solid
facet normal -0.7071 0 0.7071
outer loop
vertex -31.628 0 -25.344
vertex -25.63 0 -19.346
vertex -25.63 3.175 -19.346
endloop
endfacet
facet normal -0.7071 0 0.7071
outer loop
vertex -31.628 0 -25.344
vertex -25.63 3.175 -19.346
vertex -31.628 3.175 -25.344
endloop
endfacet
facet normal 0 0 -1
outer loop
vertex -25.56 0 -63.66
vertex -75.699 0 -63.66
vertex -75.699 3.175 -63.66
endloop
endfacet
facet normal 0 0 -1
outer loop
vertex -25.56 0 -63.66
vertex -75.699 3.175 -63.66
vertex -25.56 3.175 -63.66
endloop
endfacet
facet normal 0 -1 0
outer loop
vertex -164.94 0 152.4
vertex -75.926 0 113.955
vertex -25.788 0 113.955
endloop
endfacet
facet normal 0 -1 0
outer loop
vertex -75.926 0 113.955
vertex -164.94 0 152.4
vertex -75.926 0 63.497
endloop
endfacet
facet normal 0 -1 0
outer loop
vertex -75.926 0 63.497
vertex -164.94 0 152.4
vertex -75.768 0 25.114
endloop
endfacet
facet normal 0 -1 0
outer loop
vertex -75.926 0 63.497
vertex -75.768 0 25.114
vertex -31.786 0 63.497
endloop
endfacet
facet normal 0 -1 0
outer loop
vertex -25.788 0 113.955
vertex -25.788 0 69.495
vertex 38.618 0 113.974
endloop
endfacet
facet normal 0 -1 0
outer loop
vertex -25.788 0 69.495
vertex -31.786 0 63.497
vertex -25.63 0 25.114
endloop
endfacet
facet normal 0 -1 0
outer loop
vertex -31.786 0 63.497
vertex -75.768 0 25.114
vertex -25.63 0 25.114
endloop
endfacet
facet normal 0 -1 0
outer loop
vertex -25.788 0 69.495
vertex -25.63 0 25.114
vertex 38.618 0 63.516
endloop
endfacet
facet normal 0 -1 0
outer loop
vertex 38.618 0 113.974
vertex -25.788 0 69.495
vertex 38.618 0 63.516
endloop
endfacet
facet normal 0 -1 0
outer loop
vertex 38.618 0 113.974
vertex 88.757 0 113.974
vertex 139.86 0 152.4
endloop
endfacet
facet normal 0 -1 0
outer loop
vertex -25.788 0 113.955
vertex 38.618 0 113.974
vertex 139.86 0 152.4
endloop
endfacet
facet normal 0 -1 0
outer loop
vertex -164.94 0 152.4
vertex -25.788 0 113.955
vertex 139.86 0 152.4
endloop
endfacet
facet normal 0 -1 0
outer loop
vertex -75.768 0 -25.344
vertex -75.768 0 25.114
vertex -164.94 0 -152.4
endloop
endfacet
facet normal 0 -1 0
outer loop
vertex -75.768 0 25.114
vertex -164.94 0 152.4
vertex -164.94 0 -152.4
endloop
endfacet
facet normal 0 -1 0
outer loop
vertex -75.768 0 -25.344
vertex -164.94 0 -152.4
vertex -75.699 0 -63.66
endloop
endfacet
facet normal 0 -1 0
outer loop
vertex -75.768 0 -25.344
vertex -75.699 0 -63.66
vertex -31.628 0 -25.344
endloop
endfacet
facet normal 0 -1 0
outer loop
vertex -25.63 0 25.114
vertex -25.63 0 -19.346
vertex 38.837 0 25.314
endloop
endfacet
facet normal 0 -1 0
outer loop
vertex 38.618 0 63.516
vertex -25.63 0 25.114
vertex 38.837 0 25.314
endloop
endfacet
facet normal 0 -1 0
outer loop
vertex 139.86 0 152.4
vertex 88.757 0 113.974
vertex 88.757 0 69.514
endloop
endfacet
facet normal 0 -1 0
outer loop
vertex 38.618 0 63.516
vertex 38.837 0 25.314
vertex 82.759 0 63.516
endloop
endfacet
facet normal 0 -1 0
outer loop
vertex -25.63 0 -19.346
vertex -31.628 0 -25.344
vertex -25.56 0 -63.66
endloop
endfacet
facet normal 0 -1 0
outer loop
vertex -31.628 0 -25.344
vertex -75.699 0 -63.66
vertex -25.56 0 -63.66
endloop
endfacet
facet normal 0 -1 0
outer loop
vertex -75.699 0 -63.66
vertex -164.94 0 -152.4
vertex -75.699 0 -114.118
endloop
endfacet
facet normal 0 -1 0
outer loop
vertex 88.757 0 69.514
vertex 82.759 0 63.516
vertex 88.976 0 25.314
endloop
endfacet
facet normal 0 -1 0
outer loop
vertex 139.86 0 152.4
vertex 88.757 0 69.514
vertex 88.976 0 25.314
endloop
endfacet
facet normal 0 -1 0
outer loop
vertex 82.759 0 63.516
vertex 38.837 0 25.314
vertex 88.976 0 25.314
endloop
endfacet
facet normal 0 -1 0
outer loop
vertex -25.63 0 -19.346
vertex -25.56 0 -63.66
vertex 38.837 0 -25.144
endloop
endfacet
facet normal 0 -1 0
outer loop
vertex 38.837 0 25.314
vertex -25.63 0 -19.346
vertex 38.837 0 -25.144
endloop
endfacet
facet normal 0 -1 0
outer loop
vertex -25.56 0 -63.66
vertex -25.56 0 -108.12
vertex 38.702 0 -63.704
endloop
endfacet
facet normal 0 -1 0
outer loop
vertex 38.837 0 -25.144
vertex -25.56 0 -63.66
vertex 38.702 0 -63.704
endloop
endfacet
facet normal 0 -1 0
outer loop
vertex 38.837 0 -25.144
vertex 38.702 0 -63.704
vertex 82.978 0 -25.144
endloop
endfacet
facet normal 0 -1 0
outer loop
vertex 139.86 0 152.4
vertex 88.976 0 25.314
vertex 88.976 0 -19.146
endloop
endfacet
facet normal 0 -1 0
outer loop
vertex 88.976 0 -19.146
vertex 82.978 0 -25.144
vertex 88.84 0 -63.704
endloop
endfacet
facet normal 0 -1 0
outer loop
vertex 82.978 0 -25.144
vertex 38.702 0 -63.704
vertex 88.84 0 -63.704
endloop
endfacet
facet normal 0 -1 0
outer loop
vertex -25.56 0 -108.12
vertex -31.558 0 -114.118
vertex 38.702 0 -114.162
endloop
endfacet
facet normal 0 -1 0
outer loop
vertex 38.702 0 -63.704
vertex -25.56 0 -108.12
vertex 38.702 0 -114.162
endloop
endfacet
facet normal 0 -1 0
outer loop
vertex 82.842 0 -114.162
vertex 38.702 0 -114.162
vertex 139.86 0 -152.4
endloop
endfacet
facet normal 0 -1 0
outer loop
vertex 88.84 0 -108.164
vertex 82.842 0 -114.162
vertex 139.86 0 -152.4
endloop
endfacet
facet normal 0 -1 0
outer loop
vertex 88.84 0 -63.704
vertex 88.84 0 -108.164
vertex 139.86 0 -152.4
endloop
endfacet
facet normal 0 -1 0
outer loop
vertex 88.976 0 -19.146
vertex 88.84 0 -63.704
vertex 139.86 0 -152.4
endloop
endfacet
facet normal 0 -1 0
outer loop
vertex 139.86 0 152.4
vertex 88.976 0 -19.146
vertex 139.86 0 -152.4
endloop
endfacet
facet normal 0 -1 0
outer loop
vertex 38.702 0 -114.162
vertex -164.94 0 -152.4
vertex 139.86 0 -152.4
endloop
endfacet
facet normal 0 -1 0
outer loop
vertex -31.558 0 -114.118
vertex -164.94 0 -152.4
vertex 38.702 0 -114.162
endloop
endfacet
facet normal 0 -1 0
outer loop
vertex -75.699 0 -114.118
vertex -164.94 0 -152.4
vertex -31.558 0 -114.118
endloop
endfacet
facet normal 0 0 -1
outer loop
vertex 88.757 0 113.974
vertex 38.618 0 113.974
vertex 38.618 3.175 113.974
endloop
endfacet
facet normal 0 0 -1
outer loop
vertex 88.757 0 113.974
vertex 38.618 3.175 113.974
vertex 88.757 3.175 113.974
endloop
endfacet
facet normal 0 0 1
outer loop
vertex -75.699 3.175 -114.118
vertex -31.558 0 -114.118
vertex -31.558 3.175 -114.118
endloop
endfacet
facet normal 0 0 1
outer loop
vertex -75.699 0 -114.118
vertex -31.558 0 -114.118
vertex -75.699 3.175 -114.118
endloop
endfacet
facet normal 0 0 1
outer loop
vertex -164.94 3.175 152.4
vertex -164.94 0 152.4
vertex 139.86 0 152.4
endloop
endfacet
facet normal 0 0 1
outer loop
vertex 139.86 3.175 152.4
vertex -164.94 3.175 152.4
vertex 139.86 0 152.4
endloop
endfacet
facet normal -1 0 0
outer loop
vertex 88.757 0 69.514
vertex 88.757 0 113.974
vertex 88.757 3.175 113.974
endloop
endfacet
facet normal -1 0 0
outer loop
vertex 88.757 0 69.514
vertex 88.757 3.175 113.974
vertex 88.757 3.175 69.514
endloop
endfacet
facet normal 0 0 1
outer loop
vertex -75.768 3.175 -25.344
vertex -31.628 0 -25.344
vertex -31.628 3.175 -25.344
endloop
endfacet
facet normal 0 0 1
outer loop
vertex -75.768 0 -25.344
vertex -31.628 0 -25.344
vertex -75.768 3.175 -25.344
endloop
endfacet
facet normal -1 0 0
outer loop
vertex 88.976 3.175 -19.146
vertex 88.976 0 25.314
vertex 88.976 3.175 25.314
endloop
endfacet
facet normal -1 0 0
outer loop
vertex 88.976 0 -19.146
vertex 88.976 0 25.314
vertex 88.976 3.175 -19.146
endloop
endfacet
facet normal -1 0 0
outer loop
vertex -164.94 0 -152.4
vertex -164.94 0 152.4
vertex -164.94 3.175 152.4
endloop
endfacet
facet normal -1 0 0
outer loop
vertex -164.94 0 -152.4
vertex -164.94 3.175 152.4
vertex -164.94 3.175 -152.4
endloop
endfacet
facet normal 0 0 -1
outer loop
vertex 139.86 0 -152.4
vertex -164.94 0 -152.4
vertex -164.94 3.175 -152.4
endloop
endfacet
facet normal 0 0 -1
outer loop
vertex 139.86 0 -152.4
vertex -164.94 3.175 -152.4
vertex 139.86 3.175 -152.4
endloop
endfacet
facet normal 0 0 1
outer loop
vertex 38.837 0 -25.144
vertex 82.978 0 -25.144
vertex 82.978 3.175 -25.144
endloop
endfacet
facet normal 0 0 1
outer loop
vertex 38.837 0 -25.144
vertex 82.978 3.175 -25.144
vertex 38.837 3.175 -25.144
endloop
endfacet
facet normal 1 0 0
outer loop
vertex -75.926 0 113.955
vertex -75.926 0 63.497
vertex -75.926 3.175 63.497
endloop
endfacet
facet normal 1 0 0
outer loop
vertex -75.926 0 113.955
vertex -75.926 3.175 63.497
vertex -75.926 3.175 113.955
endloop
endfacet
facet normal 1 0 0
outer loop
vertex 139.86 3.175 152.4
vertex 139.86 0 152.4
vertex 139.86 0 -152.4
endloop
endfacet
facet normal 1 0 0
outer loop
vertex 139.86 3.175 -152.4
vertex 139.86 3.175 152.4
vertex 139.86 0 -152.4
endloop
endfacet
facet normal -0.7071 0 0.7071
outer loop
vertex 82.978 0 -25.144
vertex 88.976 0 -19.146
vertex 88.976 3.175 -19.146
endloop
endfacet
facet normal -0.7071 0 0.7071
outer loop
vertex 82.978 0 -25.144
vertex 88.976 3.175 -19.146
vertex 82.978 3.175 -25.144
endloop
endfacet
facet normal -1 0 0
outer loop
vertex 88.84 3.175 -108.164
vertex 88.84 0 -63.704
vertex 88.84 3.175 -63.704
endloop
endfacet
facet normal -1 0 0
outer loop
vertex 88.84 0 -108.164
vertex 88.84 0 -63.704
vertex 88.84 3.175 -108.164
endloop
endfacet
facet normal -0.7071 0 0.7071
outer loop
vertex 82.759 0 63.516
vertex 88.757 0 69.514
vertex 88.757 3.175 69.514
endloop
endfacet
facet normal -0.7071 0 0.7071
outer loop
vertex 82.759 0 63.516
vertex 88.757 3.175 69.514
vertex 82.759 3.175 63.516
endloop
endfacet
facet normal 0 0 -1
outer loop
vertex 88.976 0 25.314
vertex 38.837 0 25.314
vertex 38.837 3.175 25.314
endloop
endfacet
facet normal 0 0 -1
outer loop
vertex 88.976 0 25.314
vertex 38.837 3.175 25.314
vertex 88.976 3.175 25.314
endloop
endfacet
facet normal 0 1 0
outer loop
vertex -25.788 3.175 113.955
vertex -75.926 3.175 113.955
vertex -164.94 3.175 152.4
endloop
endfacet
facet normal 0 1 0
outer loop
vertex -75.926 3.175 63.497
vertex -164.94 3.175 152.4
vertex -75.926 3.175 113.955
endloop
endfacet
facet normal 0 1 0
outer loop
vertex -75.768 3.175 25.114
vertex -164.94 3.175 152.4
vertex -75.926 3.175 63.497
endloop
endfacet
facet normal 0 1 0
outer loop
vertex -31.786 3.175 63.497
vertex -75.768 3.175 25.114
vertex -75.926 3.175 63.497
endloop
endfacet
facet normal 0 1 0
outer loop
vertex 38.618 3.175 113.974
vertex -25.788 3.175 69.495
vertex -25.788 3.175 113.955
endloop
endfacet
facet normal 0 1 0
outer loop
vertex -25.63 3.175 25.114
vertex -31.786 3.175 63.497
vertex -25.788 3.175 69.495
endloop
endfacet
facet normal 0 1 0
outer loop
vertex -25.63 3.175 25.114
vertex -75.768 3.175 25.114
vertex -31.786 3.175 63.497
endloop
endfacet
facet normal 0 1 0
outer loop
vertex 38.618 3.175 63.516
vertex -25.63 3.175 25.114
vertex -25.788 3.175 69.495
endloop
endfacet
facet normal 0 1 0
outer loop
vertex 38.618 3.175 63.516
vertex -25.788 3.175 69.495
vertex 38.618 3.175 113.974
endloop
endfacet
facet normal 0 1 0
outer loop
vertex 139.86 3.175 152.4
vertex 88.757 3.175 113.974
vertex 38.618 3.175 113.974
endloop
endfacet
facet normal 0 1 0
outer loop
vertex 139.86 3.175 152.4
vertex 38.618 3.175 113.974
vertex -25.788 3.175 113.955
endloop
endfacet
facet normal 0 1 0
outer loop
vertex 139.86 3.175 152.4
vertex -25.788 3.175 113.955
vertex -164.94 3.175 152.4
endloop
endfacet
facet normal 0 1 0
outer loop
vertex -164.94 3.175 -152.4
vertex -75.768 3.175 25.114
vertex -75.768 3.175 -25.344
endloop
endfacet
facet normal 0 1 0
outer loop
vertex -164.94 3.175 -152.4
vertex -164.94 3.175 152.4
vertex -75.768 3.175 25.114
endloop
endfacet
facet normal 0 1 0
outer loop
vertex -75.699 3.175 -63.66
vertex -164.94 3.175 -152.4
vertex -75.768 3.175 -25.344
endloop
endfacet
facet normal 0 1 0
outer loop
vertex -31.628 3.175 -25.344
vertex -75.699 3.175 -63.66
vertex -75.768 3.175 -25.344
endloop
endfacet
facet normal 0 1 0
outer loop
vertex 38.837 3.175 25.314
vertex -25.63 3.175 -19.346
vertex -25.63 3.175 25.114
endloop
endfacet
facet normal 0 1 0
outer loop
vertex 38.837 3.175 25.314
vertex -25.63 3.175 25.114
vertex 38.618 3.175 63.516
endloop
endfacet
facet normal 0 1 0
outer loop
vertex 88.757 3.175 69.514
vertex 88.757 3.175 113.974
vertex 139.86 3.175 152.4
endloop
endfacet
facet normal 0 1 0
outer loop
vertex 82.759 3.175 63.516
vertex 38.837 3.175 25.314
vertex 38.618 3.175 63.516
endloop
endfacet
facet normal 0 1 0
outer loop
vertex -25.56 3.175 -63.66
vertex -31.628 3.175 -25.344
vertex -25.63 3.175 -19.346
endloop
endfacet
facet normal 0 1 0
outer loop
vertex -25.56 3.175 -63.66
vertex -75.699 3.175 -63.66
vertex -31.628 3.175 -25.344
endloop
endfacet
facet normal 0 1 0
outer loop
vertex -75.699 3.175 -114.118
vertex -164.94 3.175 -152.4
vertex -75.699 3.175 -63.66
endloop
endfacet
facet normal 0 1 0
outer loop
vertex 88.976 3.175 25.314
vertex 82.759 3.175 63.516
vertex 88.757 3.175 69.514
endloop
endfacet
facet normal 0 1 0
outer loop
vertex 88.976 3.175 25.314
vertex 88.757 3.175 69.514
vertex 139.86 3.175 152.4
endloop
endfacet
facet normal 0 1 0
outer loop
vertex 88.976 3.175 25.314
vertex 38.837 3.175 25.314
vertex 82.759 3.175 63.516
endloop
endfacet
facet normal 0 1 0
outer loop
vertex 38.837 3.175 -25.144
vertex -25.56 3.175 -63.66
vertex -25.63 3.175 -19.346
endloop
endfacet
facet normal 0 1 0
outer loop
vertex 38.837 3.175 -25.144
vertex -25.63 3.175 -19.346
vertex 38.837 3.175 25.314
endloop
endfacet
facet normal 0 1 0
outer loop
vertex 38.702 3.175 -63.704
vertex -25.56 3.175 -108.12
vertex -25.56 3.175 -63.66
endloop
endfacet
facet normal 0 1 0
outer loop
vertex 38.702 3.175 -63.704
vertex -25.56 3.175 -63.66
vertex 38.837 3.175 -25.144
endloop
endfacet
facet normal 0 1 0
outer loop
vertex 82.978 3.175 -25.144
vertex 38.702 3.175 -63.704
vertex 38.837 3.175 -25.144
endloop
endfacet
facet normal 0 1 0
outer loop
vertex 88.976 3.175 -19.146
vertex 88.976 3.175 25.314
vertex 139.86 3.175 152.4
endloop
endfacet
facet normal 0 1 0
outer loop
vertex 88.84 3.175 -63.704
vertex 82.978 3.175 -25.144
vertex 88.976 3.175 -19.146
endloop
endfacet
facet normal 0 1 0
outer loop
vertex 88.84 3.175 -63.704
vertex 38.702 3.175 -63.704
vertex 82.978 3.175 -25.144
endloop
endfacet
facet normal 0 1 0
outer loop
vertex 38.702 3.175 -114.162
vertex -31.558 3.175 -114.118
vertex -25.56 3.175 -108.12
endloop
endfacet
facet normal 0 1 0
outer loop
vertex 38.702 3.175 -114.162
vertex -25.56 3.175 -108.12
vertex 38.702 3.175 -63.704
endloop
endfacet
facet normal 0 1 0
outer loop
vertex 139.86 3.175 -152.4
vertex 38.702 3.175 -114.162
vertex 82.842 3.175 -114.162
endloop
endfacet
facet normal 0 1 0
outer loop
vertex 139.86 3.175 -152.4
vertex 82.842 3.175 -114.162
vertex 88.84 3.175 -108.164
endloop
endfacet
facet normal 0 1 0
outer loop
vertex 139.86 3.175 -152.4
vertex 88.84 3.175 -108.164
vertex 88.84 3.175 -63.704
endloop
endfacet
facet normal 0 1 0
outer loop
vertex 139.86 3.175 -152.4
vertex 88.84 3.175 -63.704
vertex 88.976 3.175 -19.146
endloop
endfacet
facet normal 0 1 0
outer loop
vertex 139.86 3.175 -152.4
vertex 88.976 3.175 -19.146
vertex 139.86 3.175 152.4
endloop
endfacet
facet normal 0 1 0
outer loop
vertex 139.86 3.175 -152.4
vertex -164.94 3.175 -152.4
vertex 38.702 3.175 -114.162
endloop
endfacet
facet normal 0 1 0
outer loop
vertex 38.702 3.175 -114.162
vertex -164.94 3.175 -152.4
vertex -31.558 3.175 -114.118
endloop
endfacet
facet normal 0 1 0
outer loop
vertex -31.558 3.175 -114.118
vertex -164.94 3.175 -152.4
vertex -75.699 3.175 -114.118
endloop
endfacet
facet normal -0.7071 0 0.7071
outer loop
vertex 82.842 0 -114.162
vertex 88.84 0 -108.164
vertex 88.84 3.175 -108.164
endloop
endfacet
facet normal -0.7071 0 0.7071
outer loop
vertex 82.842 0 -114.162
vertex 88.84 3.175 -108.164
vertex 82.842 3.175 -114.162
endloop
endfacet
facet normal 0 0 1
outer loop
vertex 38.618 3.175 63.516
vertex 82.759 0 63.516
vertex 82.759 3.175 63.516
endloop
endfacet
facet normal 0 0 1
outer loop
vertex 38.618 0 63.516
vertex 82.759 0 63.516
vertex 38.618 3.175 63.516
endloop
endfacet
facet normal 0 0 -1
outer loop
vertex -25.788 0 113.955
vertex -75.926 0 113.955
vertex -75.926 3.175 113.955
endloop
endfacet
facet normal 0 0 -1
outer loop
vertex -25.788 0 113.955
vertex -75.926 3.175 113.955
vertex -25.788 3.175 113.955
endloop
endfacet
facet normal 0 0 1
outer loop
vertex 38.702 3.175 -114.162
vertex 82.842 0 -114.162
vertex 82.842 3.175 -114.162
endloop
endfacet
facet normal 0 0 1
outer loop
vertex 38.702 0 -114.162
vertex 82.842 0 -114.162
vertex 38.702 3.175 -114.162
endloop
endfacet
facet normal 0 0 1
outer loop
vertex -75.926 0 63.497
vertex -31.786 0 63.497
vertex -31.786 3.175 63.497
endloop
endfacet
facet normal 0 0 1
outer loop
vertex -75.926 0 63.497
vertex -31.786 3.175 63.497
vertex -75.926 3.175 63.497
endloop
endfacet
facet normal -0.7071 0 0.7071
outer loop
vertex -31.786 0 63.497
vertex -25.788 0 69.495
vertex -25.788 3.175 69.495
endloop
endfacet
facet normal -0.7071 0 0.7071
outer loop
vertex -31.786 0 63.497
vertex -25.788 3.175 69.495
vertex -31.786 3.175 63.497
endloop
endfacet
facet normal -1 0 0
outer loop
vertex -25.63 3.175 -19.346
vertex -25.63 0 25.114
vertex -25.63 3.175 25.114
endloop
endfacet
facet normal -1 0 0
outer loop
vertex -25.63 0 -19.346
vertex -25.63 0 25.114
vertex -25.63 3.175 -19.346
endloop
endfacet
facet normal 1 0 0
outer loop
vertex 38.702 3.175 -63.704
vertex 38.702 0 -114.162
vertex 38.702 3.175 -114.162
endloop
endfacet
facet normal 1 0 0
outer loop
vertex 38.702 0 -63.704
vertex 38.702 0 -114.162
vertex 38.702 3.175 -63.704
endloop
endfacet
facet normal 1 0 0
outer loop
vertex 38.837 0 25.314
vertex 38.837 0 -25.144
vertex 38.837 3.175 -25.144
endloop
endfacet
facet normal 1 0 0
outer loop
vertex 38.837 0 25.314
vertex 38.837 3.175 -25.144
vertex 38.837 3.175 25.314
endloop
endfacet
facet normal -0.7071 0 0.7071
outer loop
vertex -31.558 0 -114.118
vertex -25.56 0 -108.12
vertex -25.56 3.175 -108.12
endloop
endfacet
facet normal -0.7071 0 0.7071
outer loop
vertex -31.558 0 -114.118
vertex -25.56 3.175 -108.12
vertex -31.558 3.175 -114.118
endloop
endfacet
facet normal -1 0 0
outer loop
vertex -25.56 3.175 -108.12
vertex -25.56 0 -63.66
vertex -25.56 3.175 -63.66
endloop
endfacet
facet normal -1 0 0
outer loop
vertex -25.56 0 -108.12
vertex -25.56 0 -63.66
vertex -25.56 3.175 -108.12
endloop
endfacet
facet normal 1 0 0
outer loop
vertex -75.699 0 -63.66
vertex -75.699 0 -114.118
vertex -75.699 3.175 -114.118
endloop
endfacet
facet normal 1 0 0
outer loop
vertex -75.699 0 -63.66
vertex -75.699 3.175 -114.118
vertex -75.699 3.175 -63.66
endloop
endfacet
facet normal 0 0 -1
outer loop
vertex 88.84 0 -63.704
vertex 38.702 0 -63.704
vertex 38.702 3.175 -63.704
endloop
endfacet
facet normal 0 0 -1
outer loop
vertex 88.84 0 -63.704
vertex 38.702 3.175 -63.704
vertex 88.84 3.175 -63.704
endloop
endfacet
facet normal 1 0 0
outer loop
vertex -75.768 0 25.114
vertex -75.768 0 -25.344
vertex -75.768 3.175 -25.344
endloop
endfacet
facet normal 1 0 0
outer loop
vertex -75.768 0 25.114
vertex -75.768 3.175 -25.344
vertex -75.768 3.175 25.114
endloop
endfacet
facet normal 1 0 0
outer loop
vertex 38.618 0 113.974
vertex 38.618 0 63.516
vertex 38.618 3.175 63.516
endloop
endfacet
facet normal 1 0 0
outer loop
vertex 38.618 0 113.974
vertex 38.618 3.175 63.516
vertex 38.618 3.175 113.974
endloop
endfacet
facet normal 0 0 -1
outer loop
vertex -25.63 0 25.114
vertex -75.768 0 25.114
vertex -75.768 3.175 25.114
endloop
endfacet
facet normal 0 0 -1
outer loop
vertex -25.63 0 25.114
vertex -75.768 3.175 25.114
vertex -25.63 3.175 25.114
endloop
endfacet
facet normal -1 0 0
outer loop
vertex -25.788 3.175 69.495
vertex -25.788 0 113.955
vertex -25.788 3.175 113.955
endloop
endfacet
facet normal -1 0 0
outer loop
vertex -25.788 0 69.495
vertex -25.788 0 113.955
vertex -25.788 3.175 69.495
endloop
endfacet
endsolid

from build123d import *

# Parameters (mm, degrees)
SKETCH1_W           = 304.8
SKETCH1_H           = 304.8
BOSS_EXTRUDE1_DEPTH = 3.175


with BuildPart() as part:
    # Sketch1 → Boss-Extrude1 (new body)
    with BuildSketch(Plane(origin=(0, 0, 0), x_dir=(1, 0, 0), z_dir=(0, 1, 0))):
        with Locations((-12.540052417, 0)):
            Rectangle(SKETCH1_W, SKETCH1_H)
        Polygon((-75.698500695, 63.659947583), (-25.559947583, 63.659947583), (-25.559947583, 108.120227238), (-31.557978093, 114.118257748), (-75.698500695, 114.118257748), align=None, mode=Mode.SUBTRACT)
        Polygon((38.701669621, 63.703874457), (88.840222733, 63.703874457), (88.840222733, 108.164154112), (82.842192224, 114.162184621), (38.701669621, 114.162184621), align=None, mode=Mode.SUBTRACT)
        Polygon((-75.76813518, -25.114152208), (-25.629582068, -25.114152208), (-25.629582068, 19.346127447), (-31.627612577, 25.344157957), (-75.76813518, 25.344157957), align=None, mode=Mode.SUBTRACT)
        Polygon((38.837246674, -25.31385175), (88.975799786, -25.31385175), (88.975799786, 19.146427905), (82.977769277, 25.144458414), (38.837246674, 25.144458414), align=None, mode=Mode.SUBTRACT)
        Polygon((38.618131254, -113.973933449), (88.756684366, -113.973933449), (88.756684366, -69.513653793), (82.758653857, -63.515623284), (38.618131254, -63.515623284), align=None, mode=Mode.SUBTRACT)
        Polygon((-75.926077633, -113.955197726), (-25.787524521, -113.955197726), (-25.787524521, -69.494918071), (-31.78555503, -63.496887561), (-75.926077633, -63.496887561), align=None, mode=Mode.SUBTRACT)
    extrude(amount=BOSS_EXTRUDE1_DEPTH)


solid = part.part
